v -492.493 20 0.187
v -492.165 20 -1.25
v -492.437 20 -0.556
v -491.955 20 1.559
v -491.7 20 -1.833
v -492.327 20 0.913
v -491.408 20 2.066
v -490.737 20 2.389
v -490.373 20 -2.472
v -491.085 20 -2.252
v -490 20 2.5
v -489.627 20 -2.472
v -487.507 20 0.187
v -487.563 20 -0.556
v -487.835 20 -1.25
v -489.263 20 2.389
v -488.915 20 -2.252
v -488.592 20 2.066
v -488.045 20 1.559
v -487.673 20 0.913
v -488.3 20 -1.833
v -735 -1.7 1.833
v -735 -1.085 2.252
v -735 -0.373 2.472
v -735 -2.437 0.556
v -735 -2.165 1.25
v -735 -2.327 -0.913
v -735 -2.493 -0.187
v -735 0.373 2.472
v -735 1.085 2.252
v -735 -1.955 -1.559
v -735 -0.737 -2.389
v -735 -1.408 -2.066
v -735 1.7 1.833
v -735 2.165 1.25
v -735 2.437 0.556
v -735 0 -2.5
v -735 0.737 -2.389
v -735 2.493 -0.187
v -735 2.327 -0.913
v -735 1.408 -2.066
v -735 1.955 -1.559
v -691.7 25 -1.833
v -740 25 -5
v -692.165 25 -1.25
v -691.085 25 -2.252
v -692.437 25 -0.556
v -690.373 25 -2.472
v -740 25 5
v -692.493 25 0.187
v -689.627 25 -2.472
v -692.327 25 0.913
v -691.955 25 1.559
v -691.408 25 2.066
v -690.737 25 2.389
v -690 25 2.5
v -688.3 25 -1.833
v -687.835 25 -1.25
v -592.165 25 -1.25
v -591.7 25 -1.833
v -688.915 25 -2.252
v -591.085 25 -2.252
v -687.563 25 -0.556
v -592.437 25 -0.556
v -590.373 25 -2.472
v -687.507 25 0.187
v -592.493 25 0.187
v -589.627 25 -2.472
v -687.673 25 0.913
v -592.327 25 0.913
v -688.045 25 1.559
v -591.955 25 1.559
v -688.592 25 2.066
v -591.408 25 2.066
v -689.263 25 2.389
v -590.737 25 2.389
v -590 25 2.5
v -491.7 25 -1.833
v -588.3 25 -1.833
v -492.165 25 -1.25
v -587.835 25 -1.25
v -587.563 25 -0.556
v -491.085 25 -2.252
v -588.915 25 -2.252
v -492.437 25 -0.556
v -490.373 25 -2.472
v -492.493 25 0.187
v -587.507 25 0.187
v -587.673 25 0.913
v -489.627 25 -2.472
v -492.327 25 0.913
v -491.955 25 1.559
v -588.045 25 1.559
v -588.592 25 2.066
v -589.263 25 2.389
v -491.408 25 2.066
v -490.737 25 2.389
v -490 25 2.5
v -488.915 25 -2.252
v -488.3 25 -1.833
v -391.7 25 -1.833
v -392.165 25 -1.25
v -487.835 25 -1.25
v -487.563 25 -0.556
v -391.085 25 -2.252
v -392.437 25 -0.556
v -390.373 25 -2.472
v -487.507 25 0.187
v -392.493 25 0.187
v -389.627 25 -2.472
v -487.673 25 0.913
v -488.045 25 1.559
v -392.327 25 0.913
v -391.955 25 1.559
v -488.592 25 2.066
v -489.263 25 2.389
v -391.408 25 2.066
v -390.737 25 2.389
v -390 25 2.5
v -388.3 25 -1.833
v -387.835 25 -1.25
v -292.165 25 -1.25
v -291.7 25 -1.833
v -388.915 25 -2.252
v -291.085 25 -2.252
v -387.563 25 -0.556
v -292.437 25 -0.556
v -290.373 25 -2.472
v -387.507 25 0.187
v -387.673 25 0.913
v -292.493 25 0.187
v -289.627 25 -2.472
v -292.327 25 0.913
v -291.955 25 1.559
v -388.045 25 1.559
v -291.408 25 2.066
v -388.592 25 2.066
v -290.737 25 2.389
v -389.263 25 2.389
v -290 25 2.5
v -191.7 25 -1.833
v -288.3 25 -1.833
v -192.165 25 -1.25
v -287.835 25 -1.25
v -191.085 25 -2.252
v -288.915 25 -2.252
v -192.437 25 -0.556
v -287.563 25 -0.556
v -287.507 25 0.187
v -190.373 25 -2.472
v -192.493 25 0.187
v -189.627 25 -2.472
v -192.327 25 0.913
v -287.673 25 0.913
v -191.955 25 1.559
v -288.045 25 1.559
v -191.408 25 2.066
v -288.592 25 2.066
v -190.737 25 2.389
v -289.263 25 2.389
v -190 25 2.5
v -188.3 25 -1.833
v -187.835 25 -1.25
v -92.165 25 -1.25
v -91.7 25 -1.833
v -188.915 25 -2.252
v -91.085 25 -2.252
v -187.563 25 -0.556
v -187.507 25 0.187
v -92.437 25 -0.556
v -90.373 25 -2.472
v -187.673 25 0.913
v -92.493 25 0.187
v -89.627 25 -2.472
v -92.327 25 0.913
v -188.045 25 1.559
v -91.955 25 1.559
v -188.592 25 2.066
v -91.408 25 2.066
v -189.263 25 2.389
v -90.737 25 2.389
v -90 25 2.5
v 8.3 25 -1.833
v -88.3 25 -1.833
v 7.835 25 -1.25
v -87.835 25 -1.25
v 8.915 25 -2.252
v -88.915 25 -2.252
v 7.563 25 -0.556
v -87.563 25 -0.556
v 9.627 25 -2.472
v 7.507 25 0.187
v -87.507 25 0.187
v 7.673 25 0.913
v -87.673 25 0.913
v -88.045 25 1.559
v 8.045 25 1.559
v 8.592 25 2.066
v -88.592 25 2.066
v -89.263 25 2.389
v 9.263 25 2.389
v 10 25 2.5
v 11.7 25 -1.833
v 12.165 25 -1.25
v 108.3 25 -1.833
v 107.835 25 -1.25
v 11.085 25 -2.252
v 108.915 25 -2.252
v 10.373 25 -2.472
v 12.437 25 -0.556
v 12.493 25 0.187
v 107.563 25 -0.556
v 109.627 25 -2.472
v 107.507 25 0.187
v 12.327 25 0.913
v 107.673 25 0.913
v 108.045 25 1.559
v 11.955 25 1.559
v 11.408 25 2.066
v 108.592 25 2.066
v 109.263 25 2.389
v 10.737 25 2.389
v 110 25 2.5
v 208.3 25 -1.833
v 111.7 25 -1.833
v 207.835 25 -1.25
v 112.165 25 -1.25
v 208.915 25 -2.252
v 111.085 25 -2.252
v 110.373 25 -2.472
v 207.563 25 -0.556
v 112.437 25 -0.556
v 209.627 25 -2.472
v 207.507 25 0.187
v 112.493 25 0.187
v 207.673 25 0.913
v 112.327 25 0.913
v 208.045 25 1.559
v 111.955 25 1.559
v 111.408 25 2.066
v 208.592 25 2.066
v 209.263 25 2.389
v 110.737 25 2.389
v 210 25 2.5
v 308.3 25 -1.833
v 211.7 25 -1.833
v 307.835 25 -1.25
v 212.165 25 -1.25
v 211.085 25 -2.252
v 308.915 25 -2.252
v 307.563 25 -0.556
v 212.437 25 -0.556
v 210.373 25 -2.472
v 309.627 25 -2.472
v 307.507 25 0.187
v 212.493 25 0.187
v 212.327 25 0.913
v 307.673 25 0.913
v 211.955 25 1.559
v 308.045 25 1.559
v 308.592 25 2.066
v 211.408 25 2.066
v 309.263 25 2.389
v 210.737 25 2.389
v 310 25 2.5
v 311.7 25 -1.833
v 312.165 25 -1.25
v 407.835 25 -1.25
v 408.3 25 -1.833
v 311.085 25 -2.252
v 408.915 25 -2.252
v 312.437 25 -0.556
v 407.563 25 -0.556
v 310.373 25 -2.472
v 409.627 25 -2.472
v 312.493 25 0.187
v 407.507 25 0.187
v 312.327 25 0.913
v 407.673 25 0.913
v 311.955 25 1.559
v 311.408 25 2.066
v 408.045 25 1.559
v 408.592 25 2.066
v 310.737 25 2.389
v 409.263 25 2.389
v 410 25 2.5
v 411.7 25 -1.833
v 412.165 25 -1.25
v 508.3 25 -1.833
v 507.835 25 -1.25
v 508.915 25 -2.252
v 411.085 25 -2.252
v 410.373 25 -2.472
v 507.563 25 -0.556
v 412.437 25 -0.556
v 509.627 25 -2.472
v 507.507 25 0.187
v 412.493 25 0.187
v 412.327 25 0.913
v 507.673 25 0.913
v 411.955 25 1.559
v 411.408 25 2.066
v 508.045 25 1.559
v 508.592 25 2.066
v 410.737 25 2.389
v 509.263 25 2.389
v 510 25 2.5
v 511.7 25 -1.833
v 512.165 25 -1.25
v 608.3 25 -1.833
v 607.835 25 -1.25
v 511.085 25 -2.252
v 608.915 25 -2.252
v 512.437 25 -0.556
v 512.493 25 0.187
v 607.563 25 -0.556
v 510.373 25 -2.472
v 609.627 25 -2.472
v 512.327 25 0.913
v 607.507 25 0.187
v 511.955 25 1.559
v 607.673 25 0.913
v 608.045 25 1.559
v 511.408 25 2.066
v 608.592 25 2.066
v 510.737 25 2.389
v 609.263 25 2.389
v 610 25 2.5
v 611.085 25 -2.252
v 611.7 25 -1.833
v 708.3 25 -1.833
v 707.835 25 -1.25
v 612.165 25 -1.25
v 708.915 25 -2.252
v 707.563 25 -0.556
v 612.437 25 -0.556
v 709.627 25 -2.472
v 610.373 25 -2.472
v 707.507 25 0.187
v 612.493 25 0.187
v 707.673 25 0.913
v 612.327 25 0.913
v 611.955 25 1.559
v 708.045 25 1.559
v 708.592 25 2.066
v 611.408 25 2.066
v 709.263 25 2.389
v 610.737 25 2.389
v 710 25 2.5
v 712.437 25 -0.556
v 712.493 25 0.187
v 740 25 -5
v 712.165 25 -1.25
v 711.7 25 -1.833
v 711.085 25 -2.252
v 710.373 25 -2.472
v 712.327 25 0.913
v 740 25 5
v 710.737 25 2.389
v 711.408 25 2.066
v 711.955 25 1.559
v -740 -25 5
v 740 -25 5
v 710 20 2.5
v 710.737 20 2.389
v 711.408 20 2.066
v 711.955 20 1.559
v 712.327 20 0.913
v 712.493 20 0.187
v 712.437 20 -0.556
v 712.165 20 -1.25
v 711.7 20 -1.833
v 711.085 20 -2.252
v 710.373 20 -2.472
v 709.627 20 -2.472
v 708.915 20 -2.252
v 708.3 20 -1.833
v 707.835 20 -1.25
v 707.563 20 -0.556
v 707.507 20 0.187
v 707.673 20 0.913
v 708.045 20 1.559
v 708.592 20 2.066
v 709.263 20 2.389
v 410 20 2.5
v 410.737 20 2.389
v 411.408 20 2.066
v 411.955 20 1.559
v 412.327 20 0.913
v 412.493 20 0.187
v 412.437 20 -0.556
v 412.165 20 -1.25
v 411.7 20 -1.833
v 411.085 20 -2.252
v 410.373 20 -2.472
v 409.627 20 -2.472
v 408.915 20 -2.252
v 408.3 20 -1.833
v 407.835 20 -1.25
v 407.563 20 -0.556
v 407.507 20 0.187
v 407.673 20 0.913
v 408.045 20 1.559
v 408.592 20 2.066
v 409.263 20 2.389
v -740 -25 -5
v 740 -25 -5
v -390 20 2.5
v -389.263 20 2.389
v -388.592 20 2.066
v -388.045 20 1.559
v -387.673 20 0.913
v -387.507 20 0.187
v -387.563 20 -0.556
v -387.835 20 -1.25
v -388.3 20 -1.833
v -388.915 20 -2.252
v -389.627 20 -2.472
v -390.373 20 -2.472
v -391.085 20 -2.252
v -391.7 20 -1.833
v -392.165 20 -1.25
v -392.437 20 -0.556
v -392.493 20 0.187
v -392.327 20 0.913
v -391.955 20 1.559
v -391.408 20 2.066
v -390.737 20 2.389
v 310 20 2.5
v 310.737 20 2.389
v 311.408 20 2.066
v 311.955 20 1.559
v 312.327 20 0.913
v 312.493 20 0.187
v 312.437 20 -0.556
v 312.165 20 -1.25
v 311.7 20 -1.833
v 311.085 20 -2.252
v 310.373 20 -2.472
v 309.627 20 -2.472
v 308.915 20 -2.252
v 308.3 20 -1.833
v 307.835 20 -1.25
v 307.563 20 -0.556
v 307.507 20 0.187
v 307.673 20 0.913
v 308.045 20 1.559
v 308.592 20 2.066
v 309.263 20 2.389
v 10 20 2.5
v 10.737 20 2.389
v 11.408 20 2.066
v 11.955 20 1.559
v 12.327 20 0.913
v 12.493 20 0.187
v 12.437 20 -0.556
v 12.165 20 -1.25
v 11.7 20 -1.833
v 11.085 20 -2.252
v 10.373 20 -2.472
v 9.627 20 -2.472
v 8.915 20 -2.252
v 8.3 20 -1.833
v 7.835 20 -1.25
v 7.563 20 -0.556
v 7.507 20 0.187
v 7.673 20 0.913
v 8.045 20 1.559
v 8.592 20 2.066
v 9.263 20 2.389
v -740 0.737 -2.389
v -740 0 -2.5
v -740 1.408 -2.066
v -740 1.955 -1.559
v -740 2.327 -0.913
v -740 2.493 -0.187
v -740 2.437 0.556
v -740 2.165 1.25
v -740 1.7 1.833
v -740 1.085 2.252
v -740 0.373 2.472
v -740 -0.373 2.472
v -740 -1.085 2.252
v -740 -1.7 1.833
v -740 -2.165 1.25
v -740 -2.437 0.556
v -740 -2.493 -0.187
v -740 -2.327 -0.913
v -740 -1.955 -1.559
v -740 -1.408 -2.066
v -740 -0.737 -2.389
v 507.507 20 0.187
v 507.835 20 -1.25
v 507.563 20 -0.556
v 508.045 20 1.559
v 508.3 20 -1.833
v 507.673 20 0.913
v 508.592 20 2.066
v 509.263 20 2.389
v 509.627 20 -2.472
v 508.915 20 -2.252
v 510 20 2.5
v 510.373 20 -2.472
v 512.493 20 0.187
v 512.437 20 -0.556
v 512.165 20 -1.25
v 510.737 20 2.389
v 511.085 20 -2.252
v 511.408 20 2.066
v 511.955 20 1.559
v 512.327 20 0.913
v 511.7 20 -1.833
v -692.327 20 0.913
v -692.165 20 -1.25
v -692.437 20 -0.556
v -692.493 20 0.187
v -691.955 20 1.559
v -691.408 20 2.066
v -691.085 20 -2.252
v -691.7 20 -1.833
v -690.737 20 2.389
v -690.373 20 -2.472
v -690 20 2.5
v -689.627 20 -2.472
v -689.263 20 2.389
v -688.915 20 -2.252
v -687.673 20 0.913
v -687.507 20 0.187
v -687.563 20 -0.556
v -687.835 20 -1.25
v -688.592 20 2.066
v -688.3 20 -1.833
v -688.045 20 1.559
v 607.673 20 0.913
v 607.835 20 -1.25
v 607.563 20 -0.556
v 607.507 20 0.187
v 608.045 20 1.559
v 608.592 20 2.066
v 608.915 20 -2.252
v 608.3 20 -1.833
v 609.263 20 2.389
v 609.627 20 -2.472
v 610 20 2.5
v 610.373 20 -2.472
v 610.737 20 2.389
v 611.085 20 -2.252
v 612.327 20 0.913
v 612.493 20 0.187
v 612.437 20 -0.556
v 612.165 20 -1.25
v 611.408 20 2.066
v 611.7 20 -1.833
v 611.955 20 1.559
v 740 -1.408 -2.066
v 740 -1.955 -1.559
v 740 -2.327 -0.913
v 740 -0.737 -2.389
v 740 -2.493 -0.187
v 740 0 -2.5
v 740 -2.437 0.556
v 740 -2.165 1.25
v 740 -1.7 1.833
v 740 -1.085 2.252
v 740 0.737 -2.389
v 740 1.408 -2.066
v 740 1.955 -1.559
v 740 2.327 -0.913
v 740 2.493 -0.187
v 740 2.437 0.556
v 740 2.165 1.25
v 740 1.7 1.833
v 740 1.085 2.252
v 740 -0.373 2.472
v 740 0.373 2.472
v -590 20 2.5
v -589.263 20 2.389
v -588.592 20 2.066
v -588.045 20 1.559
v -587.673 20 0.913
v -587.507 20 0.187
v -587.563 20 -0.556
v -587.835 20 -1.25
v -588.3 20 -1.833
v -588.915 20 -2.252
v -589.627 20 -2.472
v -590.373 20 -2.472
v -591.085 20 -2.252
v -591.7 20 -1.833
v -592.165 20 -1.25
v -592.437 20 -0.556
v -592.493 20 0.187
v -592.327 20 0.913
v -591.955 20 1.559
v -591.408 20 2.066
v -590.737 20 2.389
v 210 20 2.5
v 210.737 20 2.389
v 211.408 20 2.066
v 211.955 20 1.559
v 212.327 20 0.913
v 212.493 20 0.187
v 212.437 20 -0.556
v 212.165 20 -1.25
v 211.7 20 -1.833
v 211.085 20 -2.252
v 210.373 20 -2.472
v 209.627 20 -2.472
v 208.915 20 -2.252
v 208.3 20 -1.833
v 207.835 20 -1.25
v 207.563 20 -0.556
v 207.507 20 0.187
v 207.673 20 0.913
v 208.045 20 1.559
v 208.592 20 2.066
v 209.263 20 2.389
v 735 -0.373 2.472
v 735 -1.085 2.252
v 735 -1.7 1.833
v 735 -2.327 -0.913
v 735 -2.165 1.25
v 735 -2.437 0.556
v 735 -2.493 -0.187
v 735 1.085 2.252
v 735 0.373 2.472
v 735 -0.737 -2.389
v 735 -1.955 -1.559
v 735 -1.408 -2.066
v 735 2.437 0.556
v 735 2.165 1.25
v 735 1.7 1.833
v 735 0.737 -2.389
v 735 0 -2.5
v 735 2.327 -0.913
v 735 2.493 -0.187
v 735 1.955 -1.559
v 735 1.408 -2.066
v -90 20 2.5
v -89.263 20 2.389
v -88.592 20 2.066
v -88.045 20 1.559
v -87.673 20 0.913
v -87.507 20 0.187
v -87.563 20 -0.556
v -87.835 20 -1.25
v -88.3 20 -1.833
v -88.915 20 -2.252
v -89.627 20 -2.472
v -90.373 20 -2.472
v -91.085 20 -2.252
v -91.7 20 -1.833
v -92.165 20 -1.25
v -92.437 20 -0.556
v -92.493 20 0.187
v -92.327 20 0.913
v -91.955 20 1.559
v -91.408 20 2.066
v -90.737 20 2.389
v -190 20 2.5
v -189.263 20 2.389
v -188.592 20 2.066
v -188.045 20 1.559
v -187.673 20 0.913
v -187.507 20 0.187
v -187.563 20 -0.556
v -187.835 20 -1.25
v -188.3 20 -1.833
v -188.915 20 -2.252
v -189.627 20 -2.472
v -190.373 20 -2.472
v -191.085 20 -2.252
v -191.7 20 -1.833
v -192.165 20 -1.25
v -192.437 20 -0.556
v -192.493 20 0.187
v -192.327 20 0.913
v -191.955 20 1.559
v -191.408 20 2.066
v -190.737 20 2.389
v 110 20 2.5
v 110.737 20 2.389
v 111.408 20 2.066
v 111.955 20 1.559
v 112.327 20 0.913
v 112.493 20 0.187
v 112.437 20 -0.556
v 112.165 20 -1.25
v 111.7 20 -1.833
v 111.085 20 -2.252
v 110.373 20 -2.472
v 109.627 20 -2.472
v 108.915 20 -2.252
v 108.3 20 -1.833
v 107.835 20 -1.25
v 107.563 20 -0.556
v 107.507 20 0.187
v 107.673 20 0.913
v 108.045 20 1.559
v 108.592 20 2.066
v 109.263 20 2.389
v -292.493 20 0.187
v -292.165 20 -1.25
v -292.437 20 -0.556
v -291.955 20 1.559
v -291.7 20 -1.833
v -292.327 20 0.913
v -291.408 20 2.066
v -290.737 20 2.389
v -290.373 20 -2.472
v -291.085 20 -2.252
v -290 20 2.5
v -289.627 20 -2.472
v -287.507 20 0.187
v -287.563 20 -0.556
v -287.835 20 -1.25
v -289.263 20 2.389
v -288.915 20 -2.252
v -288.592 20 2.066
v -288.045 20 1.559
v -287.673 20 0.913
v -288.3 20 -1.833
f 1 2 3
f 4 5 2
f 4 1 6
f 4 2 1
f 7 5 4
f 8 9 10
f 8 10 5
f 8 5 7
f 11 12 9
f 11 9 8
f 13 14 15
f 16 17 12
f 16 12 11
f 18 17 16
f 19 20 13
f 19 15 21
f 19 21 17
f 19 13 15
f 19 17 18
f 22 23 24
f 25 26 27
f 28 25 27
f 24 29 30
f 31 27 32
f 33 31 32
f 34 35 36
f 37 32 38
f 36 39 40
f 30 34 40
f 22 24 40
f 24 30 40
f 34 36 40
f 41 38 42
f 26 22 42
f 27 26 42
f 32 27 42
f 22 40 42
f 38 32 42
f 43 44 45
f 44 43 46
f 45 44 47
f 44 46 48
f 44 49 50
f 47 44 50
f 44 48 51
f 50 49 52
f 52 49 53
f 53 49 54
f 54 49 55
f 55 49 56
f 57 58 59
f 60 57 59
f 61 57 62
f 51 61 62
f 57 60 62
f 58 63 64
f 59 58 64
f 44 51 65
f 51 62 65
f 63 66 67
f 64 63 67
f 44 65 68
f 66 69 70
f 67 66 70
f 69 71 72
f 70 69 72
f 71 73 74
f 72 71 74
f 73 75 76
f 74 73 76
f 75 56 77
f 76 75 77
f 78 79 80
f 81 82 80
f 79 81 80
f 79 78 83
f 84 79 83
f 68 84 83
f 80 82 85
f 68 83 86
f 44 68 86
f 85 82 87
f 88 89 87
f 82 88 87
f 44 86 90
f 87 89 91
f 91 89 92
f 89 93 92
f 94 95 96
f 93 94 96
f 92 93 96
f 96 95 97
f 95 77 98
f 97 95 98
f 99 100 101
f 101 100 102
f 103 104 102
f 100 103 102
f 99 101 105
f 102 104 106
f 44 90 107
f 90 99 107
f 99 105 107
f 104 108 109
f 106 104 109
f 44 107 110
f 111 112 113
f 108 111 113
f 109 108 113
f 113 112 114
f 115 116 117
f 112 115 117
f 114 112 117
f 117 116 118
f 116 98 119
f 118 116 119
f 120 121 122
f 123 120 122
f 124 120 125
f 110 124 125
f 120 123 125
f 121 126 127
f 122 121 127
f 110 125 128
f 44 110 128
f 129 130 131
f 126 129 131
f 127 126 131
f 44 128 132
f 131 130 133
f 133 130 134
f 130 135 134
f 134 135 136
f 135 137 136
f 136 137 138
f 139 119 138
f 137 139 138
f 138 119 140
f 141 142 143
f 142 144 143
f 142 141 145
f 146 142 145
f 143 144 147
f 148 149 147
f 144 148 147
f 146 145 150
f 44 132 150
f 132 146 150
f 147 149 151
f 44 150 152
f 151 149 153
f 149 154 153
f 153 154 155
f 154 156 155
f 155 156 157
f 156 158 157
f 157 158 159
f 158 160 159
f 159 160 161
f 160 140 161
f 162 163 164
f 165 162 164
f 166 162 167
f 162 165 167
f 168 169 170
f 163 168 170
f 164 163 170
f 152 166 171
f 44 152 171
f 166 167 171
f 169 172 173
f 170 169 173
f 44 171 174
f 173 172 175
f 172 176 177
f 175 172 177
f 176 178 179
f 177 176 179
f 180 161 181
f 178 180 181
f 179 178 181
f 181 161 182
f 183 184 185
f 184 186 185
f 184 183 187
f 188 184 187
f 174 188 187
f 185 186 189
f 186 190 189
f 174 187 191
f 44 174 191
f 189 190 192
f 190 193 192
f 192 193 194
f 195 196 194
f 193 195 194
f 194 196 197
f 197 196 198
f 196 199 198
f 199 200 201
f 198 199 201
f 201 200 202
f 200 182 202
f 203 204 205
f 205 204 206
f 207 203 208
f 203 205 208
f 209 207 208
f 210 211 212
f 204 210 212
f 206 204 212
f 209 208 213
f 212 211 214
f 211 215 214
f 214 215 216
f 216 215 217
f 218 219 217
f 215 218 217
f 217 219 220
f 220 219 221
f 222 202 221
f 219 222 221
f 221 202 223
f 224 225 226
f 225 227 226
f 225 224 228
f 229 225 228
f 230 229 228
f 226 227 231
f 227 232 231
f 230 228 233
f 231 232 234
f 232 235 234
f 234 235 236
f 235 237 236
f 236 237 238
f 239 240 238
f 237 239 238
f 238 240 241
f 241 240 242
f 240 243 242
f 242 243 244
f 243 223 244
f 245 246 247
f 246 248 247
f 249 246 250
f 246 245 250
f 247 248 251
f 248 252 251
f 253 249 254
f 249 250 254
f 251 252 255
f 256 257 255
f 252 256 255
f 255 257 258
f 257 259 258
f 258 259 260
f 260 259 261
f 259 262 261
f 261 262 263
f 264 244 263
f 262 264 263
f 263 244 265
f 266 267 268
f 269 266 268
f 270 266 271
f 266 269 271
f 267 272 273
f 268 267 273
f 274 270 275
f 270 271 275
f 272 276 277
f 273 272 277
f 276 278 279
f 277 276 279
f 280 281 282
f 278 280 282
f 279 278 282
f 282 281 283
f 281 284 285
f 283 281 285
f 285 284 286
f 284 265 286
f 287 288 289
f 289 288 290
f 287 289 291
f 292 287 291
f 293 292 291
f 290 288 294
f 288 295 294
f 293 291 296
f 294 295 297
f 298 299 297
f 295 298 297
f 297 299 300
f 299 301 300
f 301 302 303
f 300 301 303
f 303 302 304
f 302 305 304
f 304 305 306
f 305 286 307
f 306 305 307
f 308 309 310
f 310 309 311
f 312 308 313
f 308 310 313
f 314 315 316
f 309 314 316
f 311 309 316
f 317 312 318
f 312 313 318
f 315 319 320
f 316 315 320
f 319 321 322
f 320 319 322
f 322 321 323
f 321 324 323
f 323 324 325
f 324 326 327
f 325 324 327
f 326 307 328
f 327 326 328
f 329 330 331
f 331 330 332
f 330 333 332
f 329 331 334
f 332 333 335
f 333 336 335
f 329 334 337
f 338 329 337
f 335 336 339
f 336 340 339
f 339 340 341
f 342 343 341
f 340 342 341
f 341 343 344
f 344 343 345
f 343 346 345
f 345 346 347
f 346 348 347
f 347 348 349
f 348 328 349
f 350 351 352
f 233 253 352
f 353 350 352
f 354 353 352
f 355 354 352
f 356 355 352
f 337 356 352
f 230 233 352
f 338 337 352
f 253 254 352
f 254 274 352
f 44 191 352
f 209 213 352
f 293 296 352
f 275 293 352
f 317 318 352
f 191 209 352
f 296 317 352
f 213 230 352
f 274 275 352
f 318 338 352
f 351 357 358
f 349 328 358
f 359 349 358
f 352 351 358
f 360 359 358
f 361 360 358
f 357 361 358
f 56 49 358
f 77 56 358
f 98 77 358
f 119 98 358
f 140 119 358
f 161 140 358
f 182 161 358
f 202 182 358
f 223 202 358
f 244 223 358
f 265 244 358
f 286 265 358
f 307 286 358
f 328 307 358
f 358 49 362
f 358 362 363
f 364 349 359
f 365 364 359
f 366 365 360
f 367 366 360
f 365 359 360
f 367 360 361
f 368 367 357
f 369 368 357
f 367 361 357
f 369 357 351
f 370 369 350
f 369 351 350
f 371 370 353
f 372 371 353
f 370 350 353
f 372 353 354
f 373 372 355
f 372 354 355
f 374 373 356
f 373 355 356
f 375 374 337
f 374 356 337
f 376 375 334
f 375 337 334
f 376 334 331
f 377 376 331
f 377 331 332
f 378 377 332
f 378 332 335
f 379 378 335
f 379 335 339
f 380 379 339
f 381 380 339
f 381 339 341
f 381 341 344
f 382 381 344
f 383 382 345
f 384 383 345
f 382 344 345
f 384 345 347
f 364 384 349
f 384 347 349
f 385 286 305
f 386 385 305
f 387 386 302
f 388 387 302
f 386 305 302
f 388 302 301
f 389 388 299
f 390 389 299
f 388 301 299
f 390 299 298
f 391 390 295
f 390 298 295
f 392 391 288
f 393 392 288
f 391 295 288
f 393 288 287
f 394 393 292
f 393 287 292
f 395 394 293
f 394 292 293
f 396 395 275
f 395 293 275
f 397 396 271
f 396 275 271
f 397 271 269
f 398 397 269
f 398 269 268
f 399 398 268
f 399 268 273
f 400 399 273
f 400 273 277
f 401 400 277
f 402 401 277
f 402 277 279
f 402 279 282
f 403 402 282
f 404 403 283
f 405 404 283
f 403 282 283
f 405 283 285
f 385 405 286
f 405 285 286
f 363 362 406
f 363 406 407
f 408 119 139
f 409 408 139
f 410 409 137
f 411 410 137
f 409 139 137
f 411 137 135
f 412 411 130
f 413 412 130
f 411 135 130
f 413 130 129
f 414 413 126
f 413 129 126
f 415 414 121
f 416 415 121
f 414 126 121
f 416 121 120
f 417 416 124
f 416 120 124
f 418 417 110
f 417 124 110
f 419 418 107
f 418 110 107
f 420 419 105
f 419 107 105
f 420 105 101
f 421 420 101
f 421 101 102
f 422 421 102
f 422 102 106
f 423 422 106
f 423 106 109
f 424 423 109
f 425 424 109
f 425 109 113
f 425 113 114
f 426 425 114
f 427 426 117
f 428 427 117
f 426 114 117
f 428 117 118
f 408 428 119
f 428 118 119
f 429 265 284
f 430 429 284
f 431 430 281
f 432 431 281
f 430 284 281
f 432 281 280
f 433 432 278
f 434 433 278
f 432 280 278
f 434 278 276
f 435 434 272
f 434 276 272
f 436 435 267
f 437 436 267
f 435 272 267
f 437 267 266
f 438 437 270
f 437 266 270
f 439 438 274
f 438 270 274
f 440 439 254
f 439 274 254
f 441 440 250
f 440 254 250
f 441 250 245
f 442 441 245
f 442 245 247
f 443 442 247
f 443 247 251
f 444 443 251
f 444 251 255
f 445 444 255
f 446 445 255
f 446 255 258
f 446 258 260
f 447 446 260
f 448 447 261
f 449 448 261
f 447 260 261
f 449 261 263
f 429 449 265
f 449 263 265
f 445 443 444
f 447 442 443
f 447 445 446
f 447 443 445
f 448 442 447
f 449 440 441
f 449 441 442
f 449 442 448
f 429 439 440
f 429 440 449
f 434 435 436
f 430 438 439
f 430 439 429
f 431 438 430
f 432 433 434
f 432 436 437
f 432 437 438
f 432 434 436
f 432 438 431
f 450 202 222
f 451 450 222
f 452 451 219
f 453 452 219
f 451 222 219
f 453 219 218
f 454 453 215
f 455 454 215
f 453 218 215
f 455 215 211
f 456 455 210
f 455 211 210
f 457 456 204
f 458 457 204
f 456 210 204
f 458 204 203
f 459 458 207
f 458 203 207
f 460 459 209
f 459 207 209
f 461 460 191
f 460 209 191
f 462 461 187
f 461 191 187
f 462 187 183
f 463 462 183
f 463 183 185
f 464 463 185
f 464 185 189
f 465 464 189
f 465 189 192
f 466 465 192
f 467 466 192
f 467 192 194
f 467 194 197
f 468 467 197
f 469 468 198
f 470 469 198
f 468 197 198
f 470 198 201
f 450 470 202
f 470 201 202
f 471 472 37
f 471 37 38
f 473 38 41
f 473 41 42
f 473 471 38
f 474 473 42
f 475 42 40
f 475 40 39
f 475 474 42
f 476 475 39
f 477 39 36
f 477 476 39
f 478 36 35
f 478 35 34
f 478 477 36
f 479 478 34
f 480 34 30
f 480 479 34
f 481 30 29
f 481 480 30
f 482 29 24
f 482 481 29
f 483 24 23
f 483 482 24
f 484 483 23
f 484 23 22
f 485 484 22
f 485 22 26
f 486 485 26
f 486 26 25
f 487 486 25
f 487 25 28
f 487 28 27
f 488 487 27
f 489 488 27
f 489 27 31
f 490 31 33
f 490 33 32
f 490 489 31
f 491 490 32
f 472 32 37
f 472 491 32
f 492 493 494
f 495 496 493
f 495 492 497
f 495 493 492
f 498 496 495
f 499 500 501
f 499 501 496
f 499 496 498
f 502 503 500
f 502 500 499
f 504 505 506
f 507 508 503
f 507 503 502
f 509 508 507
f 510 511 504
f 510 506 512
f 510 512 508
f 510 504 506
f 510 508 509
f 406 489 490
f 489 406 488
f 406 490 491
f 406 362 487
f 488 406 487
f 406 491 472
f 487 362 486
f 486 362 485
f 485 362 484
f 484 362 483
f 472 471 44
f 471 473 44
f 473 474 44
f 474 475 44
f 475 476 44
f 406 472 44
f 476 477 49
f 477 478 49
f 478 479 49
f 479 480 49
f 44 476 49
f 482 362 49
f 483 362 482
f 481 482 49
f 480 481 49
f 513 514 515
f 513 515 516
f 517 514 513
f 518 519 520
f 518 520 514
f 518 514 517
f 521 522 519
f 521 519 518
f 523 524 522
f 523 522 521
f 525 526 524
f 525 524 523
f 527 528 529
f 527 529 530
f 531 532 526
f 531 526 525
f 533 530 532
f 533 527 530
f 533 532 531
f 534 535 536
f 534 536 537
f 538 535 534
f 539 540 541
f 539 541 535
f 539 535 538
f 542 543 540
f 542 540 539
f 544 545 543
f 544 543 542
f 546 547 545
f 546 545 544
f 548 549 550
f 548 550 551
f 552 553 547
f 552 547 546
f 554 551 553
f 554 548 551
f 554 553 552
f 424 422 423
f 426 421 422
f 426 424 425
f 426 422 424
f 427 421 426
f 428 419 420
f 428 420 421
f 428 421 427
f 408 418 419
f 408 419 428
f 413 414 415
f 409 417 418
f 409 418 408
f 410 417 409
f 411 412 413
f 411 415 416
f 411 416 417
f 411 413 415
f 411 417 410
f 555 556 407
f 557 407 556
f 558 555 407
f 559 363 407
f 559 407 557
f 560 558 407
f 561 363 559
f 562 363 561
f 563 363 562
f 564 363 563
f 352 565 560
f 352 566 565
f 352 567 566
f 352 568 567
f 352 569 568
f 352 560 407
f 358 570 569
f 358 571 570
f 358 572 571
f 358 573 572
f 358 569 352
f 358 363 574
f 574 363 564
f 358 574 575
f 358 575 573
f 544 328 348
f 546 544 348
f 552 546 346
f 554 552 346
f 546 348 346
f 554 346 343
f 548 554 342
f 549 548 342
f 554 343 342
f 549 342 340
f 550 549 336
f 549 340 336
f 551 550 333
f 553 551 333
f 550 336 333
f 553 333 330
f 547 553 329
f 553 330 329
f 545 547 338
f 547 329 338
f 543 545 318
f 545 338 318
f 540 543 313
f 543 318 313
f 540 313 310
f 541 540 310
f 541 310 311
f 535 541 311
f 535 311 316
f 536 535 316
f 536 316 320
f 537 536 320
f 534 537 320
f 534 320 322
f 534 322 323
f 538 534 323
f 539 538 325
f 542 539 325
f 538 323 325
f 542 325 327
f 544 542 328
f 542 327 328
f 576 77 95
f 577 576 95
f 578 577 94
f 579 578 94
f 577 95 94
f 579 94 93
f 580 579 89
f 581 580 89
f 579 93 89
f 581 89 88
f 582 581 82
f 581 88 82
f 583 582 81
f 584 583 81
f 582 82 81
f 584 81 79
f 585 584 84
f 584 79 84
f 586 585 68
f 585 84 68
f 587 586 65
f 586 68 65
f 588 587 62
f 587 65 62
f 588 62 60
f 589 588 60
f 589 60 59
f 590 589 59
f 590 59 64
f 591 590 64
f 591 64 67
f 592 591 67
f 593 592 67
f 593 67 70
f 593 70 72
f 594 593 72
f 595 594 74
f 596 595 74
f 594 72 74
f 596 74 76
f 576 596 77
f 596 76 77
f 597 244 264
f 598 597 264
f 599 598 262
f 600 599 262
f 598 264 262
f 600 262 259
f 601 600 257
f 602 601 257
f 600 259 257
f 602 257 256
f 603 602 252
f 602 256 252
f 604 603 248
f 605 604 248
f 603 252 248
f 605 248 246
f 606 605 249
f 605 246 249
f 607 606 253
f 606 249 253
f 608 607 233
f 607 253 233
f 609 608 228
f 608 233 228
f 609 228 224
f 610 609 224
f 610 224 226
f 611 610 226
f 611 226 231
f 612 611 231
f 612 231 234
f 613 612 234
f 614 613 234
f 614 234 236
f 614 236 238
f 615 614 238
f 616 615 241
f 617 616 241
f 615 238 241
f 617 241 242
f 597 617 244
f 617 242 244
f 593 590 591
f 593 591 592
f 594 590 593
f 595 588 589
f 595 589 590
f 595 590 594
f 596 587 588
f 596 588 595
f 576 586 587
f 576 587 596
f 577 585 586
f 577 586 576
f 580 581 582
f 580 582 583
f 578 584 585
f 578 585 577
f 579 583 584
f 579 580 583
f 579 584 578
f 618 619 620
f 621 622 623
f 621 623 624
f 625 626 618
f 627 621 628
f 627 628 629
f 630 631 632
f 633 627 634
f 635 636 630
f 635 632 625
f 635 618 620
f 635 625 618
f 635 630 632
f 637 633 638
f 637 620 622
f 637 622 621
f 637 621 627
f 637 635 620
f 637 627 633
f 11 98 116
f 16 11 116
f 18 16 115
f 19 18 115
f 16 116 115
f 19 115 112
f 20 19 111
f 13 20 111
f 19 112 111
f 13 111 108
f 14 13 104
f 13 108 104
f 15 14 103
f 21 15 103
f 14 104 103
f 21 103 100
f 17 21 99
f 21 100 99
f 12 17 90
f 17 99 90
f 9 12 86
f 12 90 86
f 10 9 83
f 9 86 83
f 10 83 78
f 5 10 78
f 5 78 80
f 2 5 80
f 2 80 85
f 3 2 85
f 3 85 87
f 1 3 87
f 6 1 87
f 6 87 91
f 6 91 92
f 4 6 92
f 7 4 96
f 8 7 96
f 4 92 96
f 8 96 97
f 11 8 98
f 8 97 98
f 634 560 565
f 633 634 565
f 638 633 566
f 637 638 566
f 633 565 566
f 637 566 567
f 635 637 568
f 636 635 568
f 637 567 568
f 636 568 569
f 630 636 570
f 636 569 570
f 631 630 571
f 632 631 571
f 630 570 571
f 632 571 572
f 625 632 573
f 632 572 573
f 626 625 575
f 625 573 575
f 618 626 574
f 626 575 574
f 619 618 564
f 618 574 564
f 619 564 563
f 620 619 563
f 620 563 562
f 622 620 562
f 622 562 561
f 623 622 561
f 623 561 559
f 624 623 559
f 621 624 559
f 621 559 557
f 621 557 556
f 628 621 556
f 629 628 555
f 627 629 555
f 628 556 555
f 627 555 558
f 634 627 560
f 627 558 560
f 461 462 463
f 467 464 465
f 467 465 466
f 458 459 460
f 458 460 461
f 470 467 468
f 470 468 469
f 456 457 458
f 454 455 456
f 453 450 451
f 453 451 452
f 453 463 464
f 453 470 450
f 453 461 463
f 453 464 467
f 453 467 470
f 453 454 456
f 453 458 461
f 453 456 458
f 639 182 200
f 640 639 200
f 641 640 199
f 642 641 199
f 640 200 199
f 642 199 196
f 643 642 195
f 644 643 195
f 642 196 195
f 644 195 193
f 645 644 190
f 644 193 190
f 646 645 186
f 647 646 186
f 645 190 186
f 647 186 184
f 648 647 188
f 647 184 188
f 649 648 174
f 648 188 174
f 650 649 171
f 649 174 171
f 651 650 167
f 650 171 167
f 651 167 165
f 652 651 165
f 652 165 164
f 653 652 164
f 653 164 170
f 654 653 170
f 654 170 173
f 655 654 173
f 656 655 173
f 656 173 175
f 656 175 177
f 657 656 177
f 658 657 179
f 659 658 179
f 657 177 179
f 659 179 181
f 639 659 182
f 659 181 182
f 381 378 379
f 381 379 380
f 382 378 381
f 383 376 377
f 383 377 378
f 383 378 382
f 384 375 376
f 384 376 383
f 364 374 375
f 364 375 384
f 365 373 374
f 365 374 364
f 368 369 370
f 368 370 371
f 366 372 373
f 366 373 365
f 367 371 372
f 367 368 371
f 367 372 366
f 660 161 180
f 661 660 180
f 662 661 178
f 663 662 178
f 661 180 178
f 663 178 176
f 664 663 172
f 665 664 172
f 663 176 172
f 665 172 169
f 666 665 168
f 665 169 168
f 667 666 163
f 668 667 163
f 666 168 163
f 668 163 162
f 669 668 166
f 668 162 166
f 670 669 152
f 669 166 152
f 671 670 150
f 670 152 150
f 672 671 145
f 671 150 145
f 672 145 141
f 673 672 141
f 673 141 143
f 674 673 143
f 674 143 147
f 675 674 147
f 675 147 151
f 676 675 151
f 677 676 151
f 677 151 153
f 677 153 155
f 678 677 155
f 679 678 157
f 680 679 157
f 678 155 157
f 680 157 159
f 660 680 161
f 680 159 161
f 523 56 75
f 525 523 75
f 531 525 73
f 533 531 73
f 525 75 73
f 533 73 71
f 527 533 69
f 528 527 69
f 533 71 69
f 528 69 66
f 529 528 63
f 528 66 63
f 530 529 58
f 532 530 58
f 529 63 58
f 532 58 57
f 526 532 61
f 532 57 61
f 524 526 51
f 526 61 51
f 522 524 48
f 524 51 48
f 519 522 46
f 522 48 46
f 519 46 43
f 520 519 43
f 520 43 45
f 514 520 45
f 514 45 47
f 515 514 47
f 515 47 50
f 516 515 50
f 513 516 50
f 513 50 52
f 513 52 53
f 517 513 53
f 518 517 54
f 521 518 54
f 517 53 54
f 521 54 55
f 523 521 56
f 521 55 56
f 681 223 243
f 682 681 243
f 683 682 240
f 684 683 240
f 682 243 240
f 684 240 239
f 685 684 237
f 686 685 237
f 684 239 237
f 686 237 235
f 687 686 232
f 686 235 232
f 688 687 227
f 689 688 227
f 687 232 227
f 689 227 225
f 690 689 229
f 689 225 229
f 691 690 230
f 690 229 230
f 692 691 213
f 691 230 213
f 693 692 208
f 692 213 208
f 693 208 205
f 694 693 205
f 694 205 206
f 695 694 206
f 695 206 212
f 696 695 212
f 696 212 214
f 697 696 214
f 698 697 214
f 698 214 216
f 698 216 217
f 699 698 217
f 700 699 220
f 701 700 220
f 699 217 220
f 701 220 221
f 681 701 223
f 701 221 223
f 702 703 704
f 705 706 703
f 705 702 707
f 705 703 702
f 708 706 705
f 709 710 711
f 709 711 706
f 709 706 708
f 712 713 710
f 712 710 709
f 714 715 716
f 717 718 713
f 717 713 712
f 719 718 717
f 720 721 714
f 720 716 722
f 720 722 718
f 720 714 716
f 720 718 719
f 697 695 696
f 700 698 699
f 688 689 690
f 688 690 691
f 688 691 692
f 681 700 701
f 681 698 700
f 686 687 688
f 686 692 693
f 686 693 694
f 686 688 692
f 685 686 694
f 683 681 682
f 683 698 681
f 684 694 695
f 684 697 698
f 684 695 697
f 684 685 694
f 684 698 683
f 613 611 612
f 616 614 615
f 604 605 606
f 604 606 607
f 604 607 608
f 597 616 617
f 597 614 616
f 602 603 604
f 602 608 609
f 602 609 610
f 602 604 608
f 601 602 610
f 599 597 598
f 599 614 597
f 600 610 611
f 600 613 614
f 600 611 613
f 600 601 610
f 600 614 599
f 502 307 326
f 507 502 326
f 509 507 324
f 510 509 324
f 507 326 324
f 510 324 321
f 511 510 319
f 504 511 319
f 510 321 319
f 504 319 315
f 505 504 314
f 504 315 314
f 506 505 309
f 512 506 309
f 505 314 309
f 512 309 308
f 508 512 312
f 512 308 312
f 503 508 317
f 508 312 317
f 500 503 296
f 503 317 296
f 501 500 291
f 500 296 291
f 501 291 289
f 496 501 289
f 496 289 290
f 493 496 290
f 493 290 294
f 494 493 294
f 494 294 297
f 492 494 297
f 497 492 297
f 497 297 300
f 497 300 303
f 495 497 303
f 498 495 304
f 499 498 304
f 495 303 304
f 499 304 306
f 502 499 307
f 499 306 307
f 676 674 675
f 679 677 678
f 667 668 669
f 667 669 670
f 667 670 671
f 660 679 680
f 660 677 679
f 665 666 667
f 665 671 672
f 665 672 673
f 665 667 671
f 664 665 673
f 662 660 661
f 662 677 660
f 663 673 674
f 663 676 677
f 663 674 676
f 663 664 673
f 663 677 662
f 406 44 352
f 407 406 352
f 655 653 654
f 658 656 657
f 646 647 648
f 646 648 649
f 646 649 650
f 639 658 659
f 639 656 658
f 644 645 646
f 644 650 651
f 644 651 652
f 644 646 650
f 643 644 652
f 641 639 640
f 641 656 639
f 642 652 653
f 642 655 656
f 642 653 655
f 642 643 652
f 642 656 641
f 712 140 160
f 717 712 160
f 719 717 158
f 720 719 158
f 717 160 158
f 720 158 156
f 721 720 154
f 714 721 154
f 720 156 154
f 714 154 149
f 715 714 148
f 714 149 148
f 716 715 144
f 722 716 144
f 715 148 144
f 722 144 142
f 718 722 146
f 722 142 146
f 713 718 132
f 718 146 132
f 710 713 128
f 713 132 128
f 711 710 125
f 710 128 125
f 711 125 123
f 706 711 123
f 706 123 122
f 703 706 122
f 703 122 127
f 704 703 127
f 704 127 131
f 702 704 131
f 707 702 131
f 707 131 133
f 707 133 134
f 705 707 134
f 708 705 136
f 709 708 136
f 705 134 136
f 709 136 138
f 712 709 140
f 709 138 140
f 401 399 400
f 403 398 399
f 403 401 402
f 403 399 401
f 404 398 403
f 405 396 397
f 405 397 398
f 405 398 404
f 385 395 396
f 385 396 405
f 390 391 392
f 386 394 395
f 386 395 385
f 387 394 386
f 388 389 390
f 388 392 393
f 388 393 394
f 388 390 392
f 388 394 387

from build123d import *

# Parameters (mm, degrees)
CROQUIS1_W              = 1480
CROQUIS1_H              = 50
SALIENTE_EXTRUIR1_DEPTH = 5
CROQUIS2_R              = 2.5
CORTAR_EXTRUIR1_DEPTH   = 5
CROQUIS3_R              = 2.5
CORTAR_EXTRUIR2_DEPTH   = 5


with BuildPart() as part:
    # Croquis1 → Saliente-Extruir1 (new, symmetric)
    with BuildSketch(Plane.XY):
        Rectangle(CROQUIS1_W, CROQUIS1_H)
    extrude(amount=SALIENTE_EXTRUIR1_DEPTH, both=True)

    # Croquis2 → Cortar-Extruir1 (cut)
    with BuildSketch(Plane(origin=(0, 25, 0), x_dir=(1, 0, 0), z_dir=(0, 1, 0))):
        with Locations(Location((-690, 0, 0), (0, 0, 270))):
            Circle(CROQUIS2_R)
        with Locations(Location((-590, 0, 0), (0, 0, 270))):
            Circle(CROQUIS2_R)
        with Locations(Location((-490, 0, 0), (0, 0, 270))):
            Circle(CROQUIS2_R)
        with Locations(Location((-390, 0, 0), (0, 0, 270))):
            Circle(CROQUIS2_R)
        with Locations(Location((-290, 0, 0), (0, 0, 270))):
            Circle(CROQUIS2_R)
        with Locations(Location((-190, 0, 0), (0, 0, 270))):
            Circle(CROQUIS2_R)
        with Locations(Location((-90, 0, 0), (0, 0, 270))):
            Circle(CROQUIS2_R)
        with Locations(Location((10, 0, 0), (0, 0, 270))):
            Circle(CROQUIS2_R)
        with Locations(Location((110, 0, 0), (0, 0, 270))):
            Circle(CROQUIS2_R)
        with Locations(Location((210, 0, 0), (0, 0, 270))):
            Circle(CROQUIS2_R)
        with Locations(Location((310, 0, 0), (0, 0, 270))):
            Circle(CROQUIS2_R)
        with Locations(Location((410, 0, 0), (0, 0, 270))):
            Circle(CROQUIS2_R)
        with Locations(Location((510, 0, 0), (0, 0, 270))):
            Circle(CROQUIS2_R)
        with Locations(Location((610, 0, 0), (0, 0, 270))):
            Circle(CROQUIS2_R)
        with Locations(Location((710, 0, 0), (0, 0, 270))):
            Circle(CROQUIS2_R)
    extrude(amount=-CORTAR_EXTRUIR1_DEPTH, mode=Mode.SUBTRACT)

    # Croquis3 → Cortar-Extruir2 (cut)
    with BuildSketch(Plane(origin=(740, 0, 0), x_dir=(0, 0, -1), z_dir=(1, 0, 0))):
        Circle(CROQUIS3_R)
    cortar_extruir2 = extrude(amount=-CORTAR_EXTRUIR2_DEPTH, mode=Mode.SUBTRACT)

    # Simetría1: Cortar-Extruir2 across plane
    add(cortar_extruir2.mirror(Plane(origin=(0, 0, 0), x_dir=(0, 0, 1), z_dir=(1, 0, 0))), mode=Mode.SUBTRACT)


solid = part.part
